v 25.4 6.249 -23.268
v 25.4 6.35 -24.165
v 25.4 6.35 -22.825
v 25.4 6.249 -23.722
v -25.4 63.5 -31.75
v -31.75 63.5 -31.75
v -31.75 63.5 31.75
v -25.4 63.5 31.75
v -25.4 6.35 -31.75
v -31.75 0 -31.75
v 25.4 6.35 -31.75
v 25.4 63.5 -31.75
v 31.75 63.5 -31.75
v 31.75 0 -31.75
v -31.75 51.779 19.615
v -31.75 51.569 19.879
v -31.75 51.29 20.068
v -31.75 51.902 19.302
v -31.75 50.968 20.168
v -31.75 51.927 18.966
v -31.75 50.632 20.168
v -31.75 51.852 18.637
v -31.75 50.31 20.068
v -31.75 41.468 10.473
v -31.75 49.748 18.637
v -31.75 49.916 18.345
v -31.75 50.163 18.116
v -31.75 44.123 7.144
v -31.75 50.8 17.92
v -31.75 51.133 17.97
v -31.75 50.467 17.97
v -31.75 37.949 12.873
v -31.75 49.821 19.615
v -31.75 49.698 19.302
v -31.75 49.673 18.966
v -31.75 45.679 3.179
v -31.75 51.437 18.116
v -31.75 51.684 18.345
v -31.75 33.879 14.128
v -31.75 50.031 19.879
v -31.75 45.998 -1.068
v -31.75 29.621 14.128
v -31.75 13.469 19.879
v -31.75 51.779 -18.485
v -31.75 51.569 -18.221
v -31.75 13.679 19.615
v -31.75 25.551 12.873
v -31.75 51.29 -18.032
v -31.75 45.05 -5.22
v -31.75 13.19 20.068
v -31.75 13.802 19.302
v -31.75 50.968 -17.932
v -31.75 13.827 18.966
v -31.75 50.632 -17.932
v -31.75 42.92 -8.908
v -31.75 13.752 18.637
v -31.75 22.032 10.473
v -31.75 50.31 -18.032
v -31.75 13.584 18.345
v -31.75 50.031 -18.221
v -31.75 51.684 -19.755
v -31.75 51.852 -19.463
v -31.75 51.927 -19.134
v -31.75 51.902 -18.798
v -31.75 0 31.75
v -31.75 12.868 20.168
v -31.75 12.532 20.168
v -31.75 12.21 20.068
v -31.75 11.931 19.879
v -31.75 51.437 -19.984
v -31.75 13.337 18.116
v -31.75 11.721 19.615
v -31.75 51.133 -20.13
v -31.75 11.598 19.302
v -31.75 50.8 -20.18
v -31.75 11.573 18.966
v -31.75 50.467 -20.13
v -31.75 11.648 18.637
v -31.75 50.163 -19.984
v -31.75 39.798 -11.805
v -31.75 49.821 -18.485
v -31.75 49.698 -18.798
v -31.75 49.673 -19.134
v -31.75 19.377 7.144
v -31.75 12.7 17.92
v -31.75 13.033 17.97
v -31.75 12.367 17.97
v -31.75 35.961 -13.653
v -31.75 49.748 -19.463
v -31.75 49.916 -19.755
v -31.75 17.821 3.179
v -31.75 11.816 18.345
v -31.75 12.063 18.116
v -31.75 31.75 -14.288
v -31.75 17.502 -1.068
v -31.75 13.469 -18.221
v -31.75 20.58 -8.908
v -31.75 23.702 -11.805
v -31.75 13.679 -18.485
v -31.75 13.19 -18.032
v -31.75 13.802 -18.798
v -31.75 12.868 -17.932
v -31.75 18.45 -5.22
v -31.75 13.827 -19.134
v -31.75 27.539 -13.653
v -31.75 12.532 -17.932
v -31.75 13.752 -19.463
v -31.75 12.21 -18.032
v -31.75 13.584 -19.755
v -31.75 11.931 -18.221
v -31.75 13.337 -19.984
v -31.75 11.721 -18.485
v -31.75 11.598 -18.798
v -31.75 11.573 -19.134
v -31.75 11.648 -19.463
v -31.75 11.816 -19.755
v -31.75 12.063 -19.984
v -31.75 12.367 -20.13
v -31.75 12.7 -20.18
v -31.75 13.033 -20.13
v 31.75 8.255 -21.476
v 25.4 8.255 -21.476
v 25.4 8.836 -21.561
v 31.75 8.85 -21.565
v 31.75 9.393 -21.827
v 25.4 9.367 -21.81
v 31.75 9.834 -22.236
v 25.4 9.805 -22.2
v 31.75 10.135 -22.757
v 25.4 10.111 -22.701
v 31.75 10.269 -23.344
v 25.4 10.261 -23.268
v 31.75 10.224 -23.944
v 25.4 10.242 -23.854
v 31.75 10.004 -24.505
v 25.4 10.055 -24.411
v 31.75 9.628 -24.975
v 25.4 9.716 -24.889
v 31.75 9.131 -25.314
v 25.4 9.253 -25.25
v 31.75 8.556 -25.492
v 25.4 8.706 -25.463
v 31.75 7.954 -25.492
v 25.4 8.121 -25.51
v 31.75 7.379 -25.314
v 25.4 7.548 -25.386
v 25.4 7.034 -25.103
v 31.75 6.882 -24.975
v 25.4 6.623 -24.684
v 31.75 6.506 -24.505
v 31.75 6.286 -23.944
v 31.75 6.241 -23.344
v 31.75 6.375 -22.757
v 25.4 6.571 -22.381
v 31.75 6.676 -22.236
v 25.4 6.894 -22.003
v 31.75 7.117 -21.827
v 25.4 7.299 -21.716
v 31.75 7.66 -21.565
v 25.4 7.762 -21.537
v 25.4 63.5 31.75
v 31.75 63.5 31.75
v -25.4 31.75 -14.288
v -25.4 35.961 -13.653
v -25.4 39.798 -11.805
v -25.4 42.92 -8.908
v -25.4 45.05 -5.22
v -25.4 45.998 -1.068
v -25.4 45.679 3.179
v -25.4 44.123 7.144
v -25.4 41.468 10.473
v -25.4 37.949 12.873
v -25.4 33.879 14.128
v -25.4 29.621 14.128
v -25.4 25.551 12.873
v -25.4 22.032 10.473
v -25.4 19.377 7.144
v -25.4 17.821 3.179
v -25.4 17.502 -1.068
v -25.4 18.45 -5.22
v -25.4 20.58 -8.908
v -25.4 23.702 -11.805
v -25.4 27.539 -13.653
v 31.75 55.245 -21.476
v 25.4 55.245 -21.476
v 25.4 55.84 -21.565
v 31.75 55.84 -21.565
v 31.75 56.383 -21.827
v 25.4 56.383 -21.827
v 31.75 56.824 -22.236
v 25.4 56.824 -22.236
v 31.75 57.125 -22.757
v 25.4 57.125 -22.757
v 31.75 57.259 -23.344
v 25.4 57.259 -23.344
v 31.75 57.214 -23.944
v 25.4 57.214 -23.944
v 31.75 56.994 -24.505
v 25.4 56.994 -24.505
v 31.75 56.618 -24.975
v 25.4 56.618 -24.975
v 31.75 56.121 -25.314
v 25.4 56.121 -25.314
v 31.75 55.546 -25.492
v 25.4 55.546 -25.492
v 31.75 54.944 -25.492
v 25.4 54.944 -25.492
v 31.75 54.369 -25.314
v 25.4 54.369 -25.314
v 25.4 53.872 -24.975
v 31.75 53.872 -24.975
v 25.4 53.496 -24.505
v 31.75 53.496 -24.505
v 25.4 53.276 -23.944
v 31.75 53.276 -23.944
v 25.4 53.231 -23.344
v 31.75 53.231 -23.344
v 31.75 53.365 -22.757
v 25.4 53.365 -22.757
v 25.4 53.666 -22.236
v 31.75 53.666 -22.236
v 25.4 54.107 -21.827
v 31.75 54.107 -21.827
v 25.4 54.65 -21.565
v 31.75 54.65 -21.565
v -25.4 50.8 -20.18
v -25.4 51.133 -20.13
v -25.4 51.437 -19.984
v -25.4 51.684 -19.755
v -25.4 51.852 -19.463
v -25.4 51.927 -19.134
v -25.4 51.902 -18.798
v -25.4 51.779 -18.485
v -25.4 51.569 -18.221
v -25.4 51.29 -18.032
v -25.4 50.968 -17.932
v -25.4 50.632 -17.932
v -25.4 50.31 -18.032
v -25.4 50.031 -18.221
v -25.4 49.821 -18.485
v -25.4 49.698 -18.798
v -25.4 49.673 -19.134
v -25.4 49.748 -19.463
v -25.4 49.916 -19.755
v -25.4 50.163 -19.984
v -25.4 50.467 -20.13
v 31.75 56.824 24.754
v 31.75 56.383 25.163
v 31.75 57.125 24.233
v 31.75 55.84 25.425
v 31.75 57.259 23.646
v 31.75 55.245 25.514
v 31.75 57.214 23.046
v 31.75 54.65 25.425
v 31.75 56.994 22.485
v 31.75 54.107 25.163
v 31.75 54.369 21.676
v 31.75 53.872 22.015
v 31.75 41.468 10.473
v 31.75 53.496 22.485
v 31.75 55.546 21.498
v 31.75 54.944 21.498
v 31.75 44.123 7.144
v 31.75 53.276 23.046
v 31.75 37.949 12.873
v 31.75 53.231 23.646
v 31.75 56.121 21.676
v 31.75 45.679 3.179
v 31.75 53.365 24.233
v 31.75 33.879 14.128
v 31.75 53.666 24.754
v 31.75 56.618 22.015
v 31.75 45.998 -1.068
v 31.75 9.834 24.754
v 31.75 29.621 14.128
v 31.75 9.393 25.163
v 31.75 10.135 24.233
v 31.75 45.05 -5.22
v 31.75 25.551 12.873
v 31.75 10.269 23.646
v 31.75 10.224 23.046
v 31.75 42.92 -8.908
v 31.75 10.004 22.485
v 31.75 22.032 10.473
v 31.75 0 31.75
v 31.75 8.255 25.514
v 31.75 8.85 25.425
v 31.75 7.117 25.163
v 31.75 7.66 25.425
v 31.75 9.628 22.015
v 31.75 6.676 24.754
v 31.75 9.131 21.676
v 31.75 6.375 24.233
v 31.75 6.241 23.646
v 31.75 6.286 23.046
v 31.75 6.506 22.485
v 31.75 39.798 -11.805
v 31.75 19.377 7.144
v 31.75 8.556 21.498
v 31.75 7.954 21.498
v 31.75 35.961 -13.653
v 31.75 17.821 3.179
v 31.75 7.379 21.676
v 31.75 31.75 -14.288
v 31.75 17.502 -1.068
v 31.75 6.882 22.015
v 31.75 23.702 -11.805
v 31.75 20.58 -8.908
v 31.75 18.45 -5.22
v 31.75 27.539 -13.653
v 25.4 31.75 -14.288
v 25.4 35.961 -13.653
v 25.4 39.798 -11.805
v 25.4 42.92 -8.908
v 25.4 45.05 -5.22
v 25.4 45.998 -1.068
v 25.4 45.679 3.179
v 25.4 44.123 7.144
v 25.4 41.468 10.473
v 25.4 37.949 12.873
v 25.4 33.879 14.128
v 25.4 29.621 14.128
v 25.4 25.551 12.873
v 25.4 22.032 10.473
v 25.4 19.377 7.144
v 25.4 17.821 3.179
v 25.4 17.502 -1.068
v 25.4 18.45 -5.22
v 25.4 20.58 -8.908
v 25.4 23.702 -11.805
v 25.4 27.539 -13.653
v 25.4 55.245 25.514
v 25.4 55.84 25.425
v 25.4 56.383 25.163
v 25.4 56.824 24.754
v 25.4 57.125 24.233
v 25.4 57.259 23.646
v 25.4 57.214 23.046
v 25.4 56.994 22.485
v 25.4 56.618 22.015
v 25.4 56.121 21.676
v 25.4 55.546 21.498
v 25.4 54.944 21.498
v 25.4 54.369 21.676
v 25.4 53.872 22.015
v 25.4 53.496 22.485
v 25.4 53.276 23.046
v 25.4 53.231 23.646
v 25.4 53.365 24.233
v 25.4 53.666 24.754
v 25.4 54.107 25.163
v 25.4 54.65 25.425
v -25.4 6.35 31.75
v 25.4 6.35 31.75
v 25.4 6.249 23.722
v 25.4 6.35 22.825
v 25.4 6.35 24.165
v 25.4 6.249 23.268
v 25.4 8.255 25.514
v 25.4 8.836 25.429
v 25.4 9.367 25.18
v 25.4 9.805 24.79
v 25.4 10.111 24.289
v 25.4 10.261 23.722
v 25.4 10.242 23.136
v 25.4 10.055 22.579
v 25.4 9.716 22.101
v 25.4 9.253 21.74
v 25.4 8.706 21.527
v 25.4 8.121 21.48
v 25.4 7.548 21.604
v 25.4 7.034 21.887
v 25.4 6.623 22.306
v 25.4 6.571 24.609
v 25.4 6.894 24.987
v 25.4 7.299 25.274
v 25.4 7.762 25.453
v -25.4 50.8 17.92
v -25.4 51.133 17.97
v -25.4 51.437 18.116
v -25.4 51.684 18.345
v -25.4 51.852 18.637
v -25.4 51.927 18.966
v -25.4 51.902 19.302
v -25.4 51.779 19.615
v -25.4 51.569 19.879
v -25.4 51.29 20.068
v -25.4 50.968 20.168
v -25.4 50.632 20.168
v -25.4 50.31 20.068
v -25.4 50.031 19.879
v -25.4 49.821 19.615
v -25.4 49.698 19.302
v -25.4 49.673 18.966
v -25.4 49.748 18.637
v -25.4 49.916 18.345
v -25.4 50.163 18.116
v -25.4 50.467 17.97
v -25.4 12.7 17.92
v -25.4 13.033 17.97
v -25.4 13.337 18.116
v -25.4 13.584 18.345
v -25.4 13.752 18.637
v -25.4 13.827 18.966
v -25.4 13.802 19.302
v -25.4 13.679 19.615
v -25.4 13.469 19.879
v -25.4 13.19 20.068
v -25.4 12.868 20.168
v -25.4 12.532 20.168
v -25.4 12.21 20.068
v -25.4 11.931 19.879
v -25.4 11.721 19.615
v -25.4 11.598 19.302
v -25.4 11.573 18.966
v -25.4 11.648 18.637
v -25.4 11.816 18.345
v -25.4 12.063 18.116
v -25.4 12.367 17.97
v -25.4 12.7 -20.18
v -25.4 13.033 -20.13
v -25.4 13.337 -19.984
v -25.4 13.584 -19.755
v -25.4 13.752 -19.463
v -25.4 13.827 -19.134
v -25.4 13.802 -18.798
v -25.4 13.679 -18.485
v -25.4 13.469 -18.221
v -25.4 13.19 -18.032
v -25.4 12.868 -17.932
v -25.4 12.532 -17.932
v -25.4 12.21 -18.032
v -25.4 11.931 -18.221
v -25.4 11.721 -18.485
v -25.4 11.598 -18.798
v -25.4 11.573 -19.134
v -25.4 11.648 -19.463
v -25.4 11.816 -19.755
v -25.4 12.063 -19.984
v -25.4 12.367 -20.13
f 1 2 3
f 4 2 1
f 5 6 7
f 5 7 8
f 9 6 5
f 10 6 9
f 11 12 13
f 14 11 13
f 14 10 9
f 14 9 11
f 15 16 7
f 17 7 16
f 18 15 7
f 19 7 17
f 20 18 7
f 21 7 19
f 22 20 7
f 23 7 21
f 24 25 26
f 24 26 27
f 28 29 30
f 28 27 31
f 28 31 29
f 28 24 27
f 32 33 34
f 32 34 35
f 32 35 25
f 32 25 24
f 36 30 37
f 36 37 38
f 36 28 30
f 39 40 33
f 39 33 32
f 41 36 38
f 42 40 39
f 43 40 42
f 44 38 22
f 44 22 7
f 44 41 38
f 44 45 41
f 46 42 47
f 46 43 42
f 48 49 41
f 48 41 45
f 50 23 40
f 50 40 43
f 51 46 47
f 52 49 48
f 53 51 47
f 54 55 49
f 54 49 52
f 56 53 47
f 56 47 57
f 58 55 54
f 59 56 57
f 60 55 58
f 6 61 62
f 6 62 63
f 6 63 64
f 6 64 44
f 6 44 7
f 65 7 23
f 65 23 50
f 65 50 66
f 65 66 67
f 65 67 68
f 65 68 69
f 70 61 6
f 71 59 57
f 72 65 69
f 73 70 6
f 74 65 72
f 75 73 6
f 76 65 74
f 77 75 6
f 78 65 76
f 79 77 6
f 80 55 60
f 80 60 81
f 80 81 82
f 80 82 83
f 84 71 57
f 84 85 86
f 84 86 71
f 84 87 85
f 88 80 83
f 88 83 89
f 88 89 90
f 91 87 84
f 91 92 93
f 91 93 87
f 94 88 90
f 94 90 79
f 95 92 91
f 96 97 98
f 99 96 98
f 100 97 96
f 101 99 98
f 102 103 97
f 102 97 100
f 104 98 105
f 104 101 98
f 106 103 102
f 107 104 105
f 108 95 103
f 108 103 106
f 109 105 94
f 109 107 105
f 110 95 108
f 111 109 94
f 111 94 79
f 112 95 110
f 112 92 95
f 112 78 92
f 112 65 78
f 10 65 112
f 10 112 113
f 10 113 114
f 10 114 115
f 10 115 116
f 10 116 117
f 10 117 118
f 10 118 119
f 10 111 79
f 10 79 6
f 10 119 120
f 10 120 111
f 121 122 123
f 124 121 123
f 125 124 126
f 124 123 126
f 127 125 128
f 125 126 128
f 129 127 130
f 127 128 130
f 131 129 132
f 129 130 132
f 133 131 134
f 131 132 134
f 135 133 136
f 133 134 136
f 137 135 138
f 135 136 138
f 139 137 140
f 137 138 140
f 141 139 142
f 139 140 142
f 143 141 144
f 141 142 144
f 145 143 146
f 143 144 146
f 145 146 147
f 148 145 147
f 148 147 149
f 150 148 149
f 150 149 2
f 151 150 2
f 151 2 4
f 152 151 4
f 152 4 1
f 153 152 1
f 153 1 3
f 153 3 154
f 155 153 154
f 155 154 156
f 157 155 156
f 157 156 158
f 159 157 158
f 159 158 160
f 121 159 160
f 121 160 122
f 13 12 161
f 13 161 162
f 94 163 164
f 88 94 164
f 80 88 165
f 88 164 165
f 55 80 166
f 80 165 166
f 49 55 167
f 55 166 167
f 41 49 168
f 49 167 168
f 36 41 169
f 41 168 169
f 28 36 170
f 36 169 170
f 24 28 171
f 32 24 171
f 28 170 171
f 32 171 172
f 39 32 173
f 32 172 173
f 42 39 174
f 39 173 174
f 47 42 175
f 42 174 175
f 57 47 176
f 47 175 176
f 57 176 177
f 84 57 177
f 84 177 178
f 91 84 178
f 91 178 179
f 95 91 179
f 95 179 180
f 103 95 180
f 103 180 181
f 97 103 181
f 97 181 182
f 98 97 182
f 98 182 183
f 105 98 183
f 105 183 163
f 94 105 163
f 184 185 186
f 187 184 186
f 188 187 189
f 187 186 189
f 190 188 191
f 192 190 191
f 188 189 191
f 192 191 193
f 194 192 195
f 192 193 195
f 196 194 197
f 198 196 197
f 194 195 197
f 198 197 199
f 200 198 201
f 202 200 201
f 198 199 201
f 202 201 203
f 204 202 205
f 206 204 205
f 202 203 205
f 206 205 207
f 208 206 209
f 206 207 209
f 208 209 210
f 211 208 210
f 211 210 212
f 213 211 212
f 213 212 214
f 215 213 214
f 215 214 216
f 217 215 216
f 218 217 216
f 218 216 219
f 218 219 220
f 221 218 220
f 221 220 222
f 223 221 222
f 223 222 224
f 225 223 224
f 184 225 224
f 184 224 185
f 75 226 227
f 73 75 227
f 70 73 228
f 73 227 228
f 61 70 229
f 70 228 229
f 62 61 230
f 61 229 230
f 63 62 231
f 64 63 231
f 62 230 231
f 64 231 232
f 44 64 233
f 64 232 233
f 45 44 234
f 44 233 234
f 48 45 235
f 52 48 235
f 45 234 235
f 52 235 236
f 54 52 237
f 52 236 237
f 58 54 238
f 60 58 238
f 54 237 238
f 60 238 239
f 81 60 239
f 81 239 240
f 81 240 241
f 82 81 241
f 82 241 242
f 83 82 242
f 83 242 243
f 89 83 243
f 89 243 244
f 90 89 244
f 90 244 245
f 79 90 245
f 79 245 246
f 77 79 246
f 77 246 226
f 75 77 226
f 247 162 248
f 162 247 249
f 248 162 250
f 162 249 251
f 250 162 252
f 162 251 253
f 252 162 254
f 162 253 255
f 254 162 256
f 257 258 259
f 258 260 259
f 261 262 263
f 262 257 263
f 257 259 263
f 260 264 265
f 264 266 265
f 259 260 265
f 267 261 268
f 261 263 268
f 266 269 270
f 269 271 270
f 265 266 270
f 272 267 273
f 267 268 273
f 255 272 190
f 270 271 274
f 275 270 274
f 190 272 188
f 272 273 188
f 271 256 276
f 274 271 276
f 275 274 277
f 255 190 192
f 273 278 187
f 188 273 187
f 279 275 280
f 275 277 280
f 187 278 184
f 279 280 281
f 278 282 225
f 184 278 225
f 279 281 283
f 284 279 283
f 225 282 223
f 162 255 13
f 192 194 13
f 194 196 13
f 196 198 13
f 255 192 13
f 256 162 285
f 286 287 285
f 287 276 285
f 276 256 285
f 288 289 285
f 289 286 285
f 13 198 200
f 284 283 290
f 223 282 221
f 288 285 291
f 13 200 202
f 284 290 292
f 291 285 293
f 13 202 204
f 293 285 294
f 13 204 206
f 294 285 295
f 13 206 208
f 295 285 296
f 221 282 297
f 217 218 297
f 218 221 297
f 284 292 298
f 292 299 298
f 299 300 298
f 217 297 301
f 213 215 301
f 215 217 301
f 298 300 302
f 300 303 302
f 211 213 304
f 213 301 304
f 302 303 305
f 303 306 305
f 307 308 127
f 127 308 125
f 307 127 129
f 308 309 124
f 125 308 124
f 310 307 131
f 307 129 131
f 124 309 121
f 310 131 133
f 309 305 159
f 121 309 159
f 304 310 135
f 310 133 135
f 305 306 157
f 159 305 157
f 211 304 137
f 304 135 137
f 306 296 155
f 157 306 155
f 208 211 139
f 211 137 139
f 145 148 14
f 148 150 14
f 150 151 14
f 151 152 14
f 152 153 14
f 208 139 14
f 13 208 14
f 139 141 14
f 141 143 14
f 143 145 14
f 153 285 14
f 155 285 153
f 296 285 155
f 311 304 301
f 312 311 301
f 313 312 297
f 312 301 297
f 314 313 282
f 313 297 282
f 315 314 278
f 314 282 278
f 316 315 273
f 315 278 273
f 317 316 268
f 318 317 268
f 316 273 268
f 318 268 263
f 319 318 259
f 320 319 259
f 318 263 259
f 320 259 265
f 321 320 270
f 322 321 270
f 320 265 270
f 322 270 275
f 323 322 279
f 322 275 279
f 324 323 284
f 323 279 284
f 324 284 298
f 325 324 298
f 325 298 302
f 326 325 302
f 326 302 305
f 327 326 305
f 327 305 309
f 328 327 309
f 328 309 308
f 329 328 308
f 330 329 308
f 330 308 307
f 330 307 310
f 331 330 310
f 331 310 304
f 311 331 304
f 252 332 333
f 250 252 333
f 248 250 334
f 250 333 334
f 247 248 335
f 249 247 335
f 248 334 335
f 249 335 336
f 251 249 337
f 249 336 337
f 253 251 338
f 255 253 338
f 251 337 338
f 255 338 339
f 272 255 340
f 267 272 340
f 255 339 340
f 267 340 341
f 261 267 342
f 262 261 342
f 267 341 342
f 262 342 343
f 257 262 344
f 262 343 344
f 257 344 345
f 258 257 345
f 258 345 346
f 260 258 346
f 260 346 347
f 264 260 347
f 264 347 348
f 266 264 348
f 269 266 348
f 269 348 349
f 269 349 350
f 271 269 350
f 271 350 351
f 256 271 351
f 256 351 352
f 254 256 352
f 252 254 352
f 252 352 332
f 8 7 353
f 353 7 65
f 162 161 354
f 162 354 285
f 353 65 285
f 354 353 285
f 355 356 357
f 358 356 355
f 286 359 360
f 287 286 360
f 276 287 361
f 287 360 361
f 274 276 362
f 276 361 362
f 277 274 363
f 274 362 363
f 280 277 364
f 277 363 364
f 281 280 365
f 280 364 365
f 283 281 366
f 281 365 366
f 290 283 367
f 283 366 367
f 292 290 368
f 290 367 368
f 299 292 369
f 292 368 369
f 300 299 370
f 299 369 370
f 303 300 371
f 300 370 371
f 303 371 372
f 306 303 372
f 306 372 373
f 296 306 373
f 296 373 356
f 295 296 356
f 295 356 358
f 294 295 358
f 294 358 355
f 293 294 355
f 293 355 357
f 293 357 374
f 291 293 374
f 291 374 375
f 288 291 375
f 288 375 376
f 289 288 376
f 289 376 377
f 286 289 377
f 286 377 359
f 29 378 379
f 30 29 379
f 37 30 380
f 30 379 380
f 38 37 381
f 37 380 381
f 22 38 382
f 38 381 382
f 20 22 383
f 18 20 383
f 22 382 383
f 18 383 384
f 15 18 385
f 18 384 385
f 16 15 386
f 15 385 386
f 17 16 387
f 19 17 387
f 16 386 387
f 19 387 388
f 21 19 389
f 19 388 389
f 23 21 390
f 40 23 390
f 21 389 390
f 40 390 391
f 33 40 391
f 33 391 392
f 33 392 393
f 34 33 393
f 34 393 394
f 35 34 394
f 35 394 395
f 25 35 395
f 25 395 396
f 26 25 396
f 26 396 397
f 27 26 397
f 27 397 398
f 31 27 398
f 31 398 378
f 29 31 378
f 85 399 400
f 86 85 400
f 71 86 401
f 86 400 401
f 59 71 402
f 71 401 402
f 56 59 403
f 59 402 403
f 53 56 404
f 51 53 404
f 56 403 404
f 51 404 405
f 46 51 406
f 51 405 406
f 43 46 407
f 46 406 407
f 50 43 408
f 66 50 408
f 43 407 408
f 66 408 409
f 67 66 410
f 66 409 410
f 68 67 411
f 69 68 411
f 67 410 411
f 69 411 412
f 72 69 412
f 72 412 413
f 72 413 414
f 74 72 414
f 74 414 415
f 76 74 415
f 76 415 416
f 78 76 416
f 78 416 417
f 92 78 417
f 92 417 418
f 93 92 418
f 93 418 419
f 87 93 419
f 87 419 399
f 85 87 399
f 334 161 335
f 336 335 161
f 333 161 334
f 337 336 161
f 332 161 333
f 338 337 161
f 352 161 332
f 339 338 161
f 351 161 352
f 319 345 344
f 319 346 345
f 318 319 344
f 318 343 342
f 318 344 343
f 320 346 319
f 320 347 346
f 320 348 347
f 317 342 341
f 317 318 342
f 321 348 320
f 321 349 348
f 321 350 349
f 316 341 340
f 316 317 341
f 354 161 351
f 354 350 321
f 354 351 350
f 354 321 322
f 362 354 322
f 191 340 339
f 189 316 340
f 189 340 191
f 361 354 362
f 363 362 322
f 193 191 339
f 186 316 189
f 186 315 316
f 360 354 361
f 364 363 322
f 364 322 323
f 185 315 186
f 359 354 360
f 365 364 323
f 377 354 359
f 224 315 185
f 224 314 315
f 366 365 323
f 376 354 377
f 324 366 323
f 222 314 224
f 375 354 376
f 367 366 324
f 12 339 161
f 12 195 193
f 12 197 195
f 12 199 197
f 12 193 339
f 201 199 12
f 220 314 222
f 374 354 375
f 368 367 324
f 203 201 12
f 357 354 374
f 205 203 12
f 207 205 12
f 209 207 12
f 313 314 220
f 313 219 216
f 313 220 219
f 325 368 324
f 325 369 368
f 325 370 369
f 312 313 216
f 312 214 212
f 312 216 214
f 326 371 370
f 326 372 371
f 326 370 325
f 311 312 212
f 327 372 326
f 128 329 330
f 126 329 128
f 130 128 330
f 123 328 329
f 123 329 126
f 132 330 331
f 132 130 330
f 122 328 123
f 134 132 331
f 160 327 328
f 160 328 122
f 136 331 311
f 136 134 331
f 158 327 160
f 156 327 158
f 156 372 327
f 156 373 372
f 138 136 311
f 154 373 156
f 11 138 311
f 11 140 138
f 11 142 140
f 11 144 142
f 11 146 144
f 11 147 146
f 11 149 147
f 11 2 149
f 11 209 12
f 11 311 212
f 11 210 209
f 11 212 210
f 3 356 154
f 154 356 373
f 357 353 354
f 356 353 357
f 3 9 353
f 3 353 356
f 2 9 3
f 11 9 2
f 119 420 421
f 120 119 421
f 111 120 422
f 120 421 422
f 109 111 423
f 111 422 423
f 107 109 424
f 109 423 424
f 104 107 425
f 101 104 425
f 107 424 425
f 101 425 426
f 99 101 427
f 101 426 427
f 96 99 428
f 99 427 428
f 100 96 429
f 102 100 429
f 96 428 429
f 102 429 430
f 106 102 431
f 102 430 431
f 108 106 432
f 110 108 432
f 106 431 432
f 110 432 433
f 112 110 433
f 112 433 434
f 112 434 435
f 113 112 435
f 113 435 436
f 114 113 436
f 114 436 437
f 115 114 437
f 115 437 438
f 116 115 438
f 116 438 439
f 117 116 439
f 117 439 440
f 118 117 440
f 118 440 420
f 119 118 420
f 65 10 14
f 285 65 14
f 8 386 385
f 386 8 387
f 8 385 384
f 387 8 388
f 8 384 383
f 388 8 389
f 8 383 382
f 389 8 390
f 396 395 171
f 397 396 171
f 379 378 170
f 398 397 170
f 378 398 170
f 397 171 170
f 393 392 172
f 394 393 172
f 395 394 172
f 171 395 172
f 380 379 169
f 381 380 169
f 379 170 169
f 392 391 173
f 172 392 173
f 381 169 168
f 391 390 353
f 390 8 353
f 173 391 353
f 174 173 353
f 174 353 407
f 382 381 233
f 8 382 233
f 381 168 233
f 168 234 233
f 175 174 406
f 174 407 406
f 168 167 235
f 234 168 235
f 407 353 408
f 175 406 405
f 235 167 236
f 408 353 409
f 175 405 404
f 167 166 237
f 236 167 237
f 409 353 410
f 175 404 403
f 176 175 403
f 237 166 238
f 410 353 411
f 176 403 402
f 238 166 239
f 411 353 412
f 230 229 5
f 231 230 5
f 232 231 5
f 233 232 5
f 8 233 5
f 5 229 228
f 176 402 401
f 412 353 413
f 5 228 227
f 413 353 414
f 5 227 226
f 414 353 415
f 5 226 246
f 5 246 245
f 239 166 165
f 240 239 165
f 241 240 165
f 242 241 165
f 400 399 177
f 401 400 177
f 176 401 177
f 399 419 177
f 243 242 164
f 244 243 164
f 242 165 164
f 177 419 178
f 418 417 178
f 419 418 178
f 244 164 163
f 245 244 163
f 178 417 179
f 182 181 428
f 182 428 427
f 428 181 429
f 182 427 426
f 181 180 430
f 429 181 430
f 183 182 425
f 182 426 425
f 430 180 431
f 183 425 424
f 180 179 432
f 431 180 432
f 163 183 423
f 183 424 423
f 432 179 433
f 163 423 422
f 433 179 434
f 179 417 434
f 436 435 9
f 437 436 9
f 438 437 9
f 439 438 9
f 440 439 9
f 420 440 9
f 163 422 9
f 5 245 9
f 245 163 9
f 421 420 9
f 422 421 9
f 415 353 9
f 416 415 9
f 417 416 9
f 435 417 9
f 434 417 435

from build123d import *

# Parameters (mm, degrees)
SKETCH1_3_W                     = 6.35
SKETCH1_3_H                     = 63.5
BOSS_EXTRUDE1_DEPTH             = 63.5
SKETCH1_W                       = 50.8
SKETCH1_H                       = 63.5
BOSS_EXTRUDE2_DEPTH             = 6.35
SKETCH1_6_W                     = 6.35
SKETCH1_6_H                     = 63.5
BOSS_EXTRUDE3_DEPTH             = 63.5
SKETCH2_R                       = 14.2875
CUT_EXTRUDE1_DEPTH              = 96.25
F_43_0_089_DIAMETER_HOLE1_D     = 2.2606
F_43_0_089_DIAMETER_HOLE1_DEPTH = 25.4
F_43_0_089_DIAMETER_HOLE1_TIP   = 0.679152758
F_10_32_TAPPED_HOLE1_D          = 4.0386
F_10_32_TAPPED_HOLE1_DEPTH      = 6.35


with BuildPart() as part:
    # Sketch1<3> → Boss-Extrude1 (new body)
    with BuildSketch(Plane(origin=(0, 0, 0), x_dir=(1, 0, 0), z_dir=(0, 1, 0))):
        with Locations((28.575, 0)):
            Rectangle(SKETCH1_3_W, SKETCH1_3_H)
    extrude(amount=BOSS_EXTRUDE1_DEPTH)

    # Sketch1 → Boss-Extrude2 (add)
    with BuildSketch(Plane(origin=(0, 0, 0), x_dir=(1, 0, 0), z_dir=(0, 1, 0))):
        Rectangle(SKETCH1_W, SKETCH1_H)
    extrude(amount=BOSS_EXTRUDE2_DEPTH)

    # Sketch1<6> → Boss-Extrude3 (add)
    with BuildSketch(Plane(origin=(0, 0, 0), x_dir=(1, 0, 0), z_dir=(0, 1, 0))):
        with Locations((-28.575, 0)):
            Rectangle(SKETCH1_6_W, SKETCH1_6_H)
    extrude(amount=BOSS_EXTRUDE3_DEPTH)

    # Sketch2 → Cut-Extrude1 (cut, through all)
    with BuildSketch(Plane(origin=(31.75, 0, 0), x_dir=(0, 0, -1), z_dir=(1, 0, 0))):
        with Locations((0, 31.75)):
            Circle(SKETCH2_R)
    extrude(amount=-CUT_EXTRUDE1_DEPTH, mode=Mode.SUBTRACT)

    # #43 (0.089) Diameter Hole1
    with Locations(Plane.ZY.offset(31.75)):
        with Locations((-19.05, 50.8), (19.05, 50.8), (19.05, 12.7), (-19.05, 12.7)):
            Hole(F_43_0_089_DIAMETER_HOLE1_D / 2, depth=F_43_0_089_DIAMETER_HOLE1_DEPTH)
            with Locations((0, 0, -(F_43_0_089_DIAMETER_HOLE1_DEPTH + F_43_0_089_DIAMETER_HOLE1_TIP / 2))):  # 118° drill point
                Cone(0, F_43_0_089_DIAMETER_HOLE1_D / 2, F_43_0_089_DIAMETER_HOLE1_TIP, mode=Mode.SUBTRACT)

    # #10-32 Tapped Hole1
    with Locations(Plane(origin=(31.75, 0, 0), x_dir=(0, 0, -1), z_dir=(1, 0, 0))):
        with Locations((-23.495, 55.245), (23.495, 55.245), (23.495, 8.255), (-23.495, 8.255)):
            Hole(F_10_32_TAPPED_HOLE1_D / 2, depth=F_10_32_TAPPED_HOLE1_DEPTH)


solid = part.part
